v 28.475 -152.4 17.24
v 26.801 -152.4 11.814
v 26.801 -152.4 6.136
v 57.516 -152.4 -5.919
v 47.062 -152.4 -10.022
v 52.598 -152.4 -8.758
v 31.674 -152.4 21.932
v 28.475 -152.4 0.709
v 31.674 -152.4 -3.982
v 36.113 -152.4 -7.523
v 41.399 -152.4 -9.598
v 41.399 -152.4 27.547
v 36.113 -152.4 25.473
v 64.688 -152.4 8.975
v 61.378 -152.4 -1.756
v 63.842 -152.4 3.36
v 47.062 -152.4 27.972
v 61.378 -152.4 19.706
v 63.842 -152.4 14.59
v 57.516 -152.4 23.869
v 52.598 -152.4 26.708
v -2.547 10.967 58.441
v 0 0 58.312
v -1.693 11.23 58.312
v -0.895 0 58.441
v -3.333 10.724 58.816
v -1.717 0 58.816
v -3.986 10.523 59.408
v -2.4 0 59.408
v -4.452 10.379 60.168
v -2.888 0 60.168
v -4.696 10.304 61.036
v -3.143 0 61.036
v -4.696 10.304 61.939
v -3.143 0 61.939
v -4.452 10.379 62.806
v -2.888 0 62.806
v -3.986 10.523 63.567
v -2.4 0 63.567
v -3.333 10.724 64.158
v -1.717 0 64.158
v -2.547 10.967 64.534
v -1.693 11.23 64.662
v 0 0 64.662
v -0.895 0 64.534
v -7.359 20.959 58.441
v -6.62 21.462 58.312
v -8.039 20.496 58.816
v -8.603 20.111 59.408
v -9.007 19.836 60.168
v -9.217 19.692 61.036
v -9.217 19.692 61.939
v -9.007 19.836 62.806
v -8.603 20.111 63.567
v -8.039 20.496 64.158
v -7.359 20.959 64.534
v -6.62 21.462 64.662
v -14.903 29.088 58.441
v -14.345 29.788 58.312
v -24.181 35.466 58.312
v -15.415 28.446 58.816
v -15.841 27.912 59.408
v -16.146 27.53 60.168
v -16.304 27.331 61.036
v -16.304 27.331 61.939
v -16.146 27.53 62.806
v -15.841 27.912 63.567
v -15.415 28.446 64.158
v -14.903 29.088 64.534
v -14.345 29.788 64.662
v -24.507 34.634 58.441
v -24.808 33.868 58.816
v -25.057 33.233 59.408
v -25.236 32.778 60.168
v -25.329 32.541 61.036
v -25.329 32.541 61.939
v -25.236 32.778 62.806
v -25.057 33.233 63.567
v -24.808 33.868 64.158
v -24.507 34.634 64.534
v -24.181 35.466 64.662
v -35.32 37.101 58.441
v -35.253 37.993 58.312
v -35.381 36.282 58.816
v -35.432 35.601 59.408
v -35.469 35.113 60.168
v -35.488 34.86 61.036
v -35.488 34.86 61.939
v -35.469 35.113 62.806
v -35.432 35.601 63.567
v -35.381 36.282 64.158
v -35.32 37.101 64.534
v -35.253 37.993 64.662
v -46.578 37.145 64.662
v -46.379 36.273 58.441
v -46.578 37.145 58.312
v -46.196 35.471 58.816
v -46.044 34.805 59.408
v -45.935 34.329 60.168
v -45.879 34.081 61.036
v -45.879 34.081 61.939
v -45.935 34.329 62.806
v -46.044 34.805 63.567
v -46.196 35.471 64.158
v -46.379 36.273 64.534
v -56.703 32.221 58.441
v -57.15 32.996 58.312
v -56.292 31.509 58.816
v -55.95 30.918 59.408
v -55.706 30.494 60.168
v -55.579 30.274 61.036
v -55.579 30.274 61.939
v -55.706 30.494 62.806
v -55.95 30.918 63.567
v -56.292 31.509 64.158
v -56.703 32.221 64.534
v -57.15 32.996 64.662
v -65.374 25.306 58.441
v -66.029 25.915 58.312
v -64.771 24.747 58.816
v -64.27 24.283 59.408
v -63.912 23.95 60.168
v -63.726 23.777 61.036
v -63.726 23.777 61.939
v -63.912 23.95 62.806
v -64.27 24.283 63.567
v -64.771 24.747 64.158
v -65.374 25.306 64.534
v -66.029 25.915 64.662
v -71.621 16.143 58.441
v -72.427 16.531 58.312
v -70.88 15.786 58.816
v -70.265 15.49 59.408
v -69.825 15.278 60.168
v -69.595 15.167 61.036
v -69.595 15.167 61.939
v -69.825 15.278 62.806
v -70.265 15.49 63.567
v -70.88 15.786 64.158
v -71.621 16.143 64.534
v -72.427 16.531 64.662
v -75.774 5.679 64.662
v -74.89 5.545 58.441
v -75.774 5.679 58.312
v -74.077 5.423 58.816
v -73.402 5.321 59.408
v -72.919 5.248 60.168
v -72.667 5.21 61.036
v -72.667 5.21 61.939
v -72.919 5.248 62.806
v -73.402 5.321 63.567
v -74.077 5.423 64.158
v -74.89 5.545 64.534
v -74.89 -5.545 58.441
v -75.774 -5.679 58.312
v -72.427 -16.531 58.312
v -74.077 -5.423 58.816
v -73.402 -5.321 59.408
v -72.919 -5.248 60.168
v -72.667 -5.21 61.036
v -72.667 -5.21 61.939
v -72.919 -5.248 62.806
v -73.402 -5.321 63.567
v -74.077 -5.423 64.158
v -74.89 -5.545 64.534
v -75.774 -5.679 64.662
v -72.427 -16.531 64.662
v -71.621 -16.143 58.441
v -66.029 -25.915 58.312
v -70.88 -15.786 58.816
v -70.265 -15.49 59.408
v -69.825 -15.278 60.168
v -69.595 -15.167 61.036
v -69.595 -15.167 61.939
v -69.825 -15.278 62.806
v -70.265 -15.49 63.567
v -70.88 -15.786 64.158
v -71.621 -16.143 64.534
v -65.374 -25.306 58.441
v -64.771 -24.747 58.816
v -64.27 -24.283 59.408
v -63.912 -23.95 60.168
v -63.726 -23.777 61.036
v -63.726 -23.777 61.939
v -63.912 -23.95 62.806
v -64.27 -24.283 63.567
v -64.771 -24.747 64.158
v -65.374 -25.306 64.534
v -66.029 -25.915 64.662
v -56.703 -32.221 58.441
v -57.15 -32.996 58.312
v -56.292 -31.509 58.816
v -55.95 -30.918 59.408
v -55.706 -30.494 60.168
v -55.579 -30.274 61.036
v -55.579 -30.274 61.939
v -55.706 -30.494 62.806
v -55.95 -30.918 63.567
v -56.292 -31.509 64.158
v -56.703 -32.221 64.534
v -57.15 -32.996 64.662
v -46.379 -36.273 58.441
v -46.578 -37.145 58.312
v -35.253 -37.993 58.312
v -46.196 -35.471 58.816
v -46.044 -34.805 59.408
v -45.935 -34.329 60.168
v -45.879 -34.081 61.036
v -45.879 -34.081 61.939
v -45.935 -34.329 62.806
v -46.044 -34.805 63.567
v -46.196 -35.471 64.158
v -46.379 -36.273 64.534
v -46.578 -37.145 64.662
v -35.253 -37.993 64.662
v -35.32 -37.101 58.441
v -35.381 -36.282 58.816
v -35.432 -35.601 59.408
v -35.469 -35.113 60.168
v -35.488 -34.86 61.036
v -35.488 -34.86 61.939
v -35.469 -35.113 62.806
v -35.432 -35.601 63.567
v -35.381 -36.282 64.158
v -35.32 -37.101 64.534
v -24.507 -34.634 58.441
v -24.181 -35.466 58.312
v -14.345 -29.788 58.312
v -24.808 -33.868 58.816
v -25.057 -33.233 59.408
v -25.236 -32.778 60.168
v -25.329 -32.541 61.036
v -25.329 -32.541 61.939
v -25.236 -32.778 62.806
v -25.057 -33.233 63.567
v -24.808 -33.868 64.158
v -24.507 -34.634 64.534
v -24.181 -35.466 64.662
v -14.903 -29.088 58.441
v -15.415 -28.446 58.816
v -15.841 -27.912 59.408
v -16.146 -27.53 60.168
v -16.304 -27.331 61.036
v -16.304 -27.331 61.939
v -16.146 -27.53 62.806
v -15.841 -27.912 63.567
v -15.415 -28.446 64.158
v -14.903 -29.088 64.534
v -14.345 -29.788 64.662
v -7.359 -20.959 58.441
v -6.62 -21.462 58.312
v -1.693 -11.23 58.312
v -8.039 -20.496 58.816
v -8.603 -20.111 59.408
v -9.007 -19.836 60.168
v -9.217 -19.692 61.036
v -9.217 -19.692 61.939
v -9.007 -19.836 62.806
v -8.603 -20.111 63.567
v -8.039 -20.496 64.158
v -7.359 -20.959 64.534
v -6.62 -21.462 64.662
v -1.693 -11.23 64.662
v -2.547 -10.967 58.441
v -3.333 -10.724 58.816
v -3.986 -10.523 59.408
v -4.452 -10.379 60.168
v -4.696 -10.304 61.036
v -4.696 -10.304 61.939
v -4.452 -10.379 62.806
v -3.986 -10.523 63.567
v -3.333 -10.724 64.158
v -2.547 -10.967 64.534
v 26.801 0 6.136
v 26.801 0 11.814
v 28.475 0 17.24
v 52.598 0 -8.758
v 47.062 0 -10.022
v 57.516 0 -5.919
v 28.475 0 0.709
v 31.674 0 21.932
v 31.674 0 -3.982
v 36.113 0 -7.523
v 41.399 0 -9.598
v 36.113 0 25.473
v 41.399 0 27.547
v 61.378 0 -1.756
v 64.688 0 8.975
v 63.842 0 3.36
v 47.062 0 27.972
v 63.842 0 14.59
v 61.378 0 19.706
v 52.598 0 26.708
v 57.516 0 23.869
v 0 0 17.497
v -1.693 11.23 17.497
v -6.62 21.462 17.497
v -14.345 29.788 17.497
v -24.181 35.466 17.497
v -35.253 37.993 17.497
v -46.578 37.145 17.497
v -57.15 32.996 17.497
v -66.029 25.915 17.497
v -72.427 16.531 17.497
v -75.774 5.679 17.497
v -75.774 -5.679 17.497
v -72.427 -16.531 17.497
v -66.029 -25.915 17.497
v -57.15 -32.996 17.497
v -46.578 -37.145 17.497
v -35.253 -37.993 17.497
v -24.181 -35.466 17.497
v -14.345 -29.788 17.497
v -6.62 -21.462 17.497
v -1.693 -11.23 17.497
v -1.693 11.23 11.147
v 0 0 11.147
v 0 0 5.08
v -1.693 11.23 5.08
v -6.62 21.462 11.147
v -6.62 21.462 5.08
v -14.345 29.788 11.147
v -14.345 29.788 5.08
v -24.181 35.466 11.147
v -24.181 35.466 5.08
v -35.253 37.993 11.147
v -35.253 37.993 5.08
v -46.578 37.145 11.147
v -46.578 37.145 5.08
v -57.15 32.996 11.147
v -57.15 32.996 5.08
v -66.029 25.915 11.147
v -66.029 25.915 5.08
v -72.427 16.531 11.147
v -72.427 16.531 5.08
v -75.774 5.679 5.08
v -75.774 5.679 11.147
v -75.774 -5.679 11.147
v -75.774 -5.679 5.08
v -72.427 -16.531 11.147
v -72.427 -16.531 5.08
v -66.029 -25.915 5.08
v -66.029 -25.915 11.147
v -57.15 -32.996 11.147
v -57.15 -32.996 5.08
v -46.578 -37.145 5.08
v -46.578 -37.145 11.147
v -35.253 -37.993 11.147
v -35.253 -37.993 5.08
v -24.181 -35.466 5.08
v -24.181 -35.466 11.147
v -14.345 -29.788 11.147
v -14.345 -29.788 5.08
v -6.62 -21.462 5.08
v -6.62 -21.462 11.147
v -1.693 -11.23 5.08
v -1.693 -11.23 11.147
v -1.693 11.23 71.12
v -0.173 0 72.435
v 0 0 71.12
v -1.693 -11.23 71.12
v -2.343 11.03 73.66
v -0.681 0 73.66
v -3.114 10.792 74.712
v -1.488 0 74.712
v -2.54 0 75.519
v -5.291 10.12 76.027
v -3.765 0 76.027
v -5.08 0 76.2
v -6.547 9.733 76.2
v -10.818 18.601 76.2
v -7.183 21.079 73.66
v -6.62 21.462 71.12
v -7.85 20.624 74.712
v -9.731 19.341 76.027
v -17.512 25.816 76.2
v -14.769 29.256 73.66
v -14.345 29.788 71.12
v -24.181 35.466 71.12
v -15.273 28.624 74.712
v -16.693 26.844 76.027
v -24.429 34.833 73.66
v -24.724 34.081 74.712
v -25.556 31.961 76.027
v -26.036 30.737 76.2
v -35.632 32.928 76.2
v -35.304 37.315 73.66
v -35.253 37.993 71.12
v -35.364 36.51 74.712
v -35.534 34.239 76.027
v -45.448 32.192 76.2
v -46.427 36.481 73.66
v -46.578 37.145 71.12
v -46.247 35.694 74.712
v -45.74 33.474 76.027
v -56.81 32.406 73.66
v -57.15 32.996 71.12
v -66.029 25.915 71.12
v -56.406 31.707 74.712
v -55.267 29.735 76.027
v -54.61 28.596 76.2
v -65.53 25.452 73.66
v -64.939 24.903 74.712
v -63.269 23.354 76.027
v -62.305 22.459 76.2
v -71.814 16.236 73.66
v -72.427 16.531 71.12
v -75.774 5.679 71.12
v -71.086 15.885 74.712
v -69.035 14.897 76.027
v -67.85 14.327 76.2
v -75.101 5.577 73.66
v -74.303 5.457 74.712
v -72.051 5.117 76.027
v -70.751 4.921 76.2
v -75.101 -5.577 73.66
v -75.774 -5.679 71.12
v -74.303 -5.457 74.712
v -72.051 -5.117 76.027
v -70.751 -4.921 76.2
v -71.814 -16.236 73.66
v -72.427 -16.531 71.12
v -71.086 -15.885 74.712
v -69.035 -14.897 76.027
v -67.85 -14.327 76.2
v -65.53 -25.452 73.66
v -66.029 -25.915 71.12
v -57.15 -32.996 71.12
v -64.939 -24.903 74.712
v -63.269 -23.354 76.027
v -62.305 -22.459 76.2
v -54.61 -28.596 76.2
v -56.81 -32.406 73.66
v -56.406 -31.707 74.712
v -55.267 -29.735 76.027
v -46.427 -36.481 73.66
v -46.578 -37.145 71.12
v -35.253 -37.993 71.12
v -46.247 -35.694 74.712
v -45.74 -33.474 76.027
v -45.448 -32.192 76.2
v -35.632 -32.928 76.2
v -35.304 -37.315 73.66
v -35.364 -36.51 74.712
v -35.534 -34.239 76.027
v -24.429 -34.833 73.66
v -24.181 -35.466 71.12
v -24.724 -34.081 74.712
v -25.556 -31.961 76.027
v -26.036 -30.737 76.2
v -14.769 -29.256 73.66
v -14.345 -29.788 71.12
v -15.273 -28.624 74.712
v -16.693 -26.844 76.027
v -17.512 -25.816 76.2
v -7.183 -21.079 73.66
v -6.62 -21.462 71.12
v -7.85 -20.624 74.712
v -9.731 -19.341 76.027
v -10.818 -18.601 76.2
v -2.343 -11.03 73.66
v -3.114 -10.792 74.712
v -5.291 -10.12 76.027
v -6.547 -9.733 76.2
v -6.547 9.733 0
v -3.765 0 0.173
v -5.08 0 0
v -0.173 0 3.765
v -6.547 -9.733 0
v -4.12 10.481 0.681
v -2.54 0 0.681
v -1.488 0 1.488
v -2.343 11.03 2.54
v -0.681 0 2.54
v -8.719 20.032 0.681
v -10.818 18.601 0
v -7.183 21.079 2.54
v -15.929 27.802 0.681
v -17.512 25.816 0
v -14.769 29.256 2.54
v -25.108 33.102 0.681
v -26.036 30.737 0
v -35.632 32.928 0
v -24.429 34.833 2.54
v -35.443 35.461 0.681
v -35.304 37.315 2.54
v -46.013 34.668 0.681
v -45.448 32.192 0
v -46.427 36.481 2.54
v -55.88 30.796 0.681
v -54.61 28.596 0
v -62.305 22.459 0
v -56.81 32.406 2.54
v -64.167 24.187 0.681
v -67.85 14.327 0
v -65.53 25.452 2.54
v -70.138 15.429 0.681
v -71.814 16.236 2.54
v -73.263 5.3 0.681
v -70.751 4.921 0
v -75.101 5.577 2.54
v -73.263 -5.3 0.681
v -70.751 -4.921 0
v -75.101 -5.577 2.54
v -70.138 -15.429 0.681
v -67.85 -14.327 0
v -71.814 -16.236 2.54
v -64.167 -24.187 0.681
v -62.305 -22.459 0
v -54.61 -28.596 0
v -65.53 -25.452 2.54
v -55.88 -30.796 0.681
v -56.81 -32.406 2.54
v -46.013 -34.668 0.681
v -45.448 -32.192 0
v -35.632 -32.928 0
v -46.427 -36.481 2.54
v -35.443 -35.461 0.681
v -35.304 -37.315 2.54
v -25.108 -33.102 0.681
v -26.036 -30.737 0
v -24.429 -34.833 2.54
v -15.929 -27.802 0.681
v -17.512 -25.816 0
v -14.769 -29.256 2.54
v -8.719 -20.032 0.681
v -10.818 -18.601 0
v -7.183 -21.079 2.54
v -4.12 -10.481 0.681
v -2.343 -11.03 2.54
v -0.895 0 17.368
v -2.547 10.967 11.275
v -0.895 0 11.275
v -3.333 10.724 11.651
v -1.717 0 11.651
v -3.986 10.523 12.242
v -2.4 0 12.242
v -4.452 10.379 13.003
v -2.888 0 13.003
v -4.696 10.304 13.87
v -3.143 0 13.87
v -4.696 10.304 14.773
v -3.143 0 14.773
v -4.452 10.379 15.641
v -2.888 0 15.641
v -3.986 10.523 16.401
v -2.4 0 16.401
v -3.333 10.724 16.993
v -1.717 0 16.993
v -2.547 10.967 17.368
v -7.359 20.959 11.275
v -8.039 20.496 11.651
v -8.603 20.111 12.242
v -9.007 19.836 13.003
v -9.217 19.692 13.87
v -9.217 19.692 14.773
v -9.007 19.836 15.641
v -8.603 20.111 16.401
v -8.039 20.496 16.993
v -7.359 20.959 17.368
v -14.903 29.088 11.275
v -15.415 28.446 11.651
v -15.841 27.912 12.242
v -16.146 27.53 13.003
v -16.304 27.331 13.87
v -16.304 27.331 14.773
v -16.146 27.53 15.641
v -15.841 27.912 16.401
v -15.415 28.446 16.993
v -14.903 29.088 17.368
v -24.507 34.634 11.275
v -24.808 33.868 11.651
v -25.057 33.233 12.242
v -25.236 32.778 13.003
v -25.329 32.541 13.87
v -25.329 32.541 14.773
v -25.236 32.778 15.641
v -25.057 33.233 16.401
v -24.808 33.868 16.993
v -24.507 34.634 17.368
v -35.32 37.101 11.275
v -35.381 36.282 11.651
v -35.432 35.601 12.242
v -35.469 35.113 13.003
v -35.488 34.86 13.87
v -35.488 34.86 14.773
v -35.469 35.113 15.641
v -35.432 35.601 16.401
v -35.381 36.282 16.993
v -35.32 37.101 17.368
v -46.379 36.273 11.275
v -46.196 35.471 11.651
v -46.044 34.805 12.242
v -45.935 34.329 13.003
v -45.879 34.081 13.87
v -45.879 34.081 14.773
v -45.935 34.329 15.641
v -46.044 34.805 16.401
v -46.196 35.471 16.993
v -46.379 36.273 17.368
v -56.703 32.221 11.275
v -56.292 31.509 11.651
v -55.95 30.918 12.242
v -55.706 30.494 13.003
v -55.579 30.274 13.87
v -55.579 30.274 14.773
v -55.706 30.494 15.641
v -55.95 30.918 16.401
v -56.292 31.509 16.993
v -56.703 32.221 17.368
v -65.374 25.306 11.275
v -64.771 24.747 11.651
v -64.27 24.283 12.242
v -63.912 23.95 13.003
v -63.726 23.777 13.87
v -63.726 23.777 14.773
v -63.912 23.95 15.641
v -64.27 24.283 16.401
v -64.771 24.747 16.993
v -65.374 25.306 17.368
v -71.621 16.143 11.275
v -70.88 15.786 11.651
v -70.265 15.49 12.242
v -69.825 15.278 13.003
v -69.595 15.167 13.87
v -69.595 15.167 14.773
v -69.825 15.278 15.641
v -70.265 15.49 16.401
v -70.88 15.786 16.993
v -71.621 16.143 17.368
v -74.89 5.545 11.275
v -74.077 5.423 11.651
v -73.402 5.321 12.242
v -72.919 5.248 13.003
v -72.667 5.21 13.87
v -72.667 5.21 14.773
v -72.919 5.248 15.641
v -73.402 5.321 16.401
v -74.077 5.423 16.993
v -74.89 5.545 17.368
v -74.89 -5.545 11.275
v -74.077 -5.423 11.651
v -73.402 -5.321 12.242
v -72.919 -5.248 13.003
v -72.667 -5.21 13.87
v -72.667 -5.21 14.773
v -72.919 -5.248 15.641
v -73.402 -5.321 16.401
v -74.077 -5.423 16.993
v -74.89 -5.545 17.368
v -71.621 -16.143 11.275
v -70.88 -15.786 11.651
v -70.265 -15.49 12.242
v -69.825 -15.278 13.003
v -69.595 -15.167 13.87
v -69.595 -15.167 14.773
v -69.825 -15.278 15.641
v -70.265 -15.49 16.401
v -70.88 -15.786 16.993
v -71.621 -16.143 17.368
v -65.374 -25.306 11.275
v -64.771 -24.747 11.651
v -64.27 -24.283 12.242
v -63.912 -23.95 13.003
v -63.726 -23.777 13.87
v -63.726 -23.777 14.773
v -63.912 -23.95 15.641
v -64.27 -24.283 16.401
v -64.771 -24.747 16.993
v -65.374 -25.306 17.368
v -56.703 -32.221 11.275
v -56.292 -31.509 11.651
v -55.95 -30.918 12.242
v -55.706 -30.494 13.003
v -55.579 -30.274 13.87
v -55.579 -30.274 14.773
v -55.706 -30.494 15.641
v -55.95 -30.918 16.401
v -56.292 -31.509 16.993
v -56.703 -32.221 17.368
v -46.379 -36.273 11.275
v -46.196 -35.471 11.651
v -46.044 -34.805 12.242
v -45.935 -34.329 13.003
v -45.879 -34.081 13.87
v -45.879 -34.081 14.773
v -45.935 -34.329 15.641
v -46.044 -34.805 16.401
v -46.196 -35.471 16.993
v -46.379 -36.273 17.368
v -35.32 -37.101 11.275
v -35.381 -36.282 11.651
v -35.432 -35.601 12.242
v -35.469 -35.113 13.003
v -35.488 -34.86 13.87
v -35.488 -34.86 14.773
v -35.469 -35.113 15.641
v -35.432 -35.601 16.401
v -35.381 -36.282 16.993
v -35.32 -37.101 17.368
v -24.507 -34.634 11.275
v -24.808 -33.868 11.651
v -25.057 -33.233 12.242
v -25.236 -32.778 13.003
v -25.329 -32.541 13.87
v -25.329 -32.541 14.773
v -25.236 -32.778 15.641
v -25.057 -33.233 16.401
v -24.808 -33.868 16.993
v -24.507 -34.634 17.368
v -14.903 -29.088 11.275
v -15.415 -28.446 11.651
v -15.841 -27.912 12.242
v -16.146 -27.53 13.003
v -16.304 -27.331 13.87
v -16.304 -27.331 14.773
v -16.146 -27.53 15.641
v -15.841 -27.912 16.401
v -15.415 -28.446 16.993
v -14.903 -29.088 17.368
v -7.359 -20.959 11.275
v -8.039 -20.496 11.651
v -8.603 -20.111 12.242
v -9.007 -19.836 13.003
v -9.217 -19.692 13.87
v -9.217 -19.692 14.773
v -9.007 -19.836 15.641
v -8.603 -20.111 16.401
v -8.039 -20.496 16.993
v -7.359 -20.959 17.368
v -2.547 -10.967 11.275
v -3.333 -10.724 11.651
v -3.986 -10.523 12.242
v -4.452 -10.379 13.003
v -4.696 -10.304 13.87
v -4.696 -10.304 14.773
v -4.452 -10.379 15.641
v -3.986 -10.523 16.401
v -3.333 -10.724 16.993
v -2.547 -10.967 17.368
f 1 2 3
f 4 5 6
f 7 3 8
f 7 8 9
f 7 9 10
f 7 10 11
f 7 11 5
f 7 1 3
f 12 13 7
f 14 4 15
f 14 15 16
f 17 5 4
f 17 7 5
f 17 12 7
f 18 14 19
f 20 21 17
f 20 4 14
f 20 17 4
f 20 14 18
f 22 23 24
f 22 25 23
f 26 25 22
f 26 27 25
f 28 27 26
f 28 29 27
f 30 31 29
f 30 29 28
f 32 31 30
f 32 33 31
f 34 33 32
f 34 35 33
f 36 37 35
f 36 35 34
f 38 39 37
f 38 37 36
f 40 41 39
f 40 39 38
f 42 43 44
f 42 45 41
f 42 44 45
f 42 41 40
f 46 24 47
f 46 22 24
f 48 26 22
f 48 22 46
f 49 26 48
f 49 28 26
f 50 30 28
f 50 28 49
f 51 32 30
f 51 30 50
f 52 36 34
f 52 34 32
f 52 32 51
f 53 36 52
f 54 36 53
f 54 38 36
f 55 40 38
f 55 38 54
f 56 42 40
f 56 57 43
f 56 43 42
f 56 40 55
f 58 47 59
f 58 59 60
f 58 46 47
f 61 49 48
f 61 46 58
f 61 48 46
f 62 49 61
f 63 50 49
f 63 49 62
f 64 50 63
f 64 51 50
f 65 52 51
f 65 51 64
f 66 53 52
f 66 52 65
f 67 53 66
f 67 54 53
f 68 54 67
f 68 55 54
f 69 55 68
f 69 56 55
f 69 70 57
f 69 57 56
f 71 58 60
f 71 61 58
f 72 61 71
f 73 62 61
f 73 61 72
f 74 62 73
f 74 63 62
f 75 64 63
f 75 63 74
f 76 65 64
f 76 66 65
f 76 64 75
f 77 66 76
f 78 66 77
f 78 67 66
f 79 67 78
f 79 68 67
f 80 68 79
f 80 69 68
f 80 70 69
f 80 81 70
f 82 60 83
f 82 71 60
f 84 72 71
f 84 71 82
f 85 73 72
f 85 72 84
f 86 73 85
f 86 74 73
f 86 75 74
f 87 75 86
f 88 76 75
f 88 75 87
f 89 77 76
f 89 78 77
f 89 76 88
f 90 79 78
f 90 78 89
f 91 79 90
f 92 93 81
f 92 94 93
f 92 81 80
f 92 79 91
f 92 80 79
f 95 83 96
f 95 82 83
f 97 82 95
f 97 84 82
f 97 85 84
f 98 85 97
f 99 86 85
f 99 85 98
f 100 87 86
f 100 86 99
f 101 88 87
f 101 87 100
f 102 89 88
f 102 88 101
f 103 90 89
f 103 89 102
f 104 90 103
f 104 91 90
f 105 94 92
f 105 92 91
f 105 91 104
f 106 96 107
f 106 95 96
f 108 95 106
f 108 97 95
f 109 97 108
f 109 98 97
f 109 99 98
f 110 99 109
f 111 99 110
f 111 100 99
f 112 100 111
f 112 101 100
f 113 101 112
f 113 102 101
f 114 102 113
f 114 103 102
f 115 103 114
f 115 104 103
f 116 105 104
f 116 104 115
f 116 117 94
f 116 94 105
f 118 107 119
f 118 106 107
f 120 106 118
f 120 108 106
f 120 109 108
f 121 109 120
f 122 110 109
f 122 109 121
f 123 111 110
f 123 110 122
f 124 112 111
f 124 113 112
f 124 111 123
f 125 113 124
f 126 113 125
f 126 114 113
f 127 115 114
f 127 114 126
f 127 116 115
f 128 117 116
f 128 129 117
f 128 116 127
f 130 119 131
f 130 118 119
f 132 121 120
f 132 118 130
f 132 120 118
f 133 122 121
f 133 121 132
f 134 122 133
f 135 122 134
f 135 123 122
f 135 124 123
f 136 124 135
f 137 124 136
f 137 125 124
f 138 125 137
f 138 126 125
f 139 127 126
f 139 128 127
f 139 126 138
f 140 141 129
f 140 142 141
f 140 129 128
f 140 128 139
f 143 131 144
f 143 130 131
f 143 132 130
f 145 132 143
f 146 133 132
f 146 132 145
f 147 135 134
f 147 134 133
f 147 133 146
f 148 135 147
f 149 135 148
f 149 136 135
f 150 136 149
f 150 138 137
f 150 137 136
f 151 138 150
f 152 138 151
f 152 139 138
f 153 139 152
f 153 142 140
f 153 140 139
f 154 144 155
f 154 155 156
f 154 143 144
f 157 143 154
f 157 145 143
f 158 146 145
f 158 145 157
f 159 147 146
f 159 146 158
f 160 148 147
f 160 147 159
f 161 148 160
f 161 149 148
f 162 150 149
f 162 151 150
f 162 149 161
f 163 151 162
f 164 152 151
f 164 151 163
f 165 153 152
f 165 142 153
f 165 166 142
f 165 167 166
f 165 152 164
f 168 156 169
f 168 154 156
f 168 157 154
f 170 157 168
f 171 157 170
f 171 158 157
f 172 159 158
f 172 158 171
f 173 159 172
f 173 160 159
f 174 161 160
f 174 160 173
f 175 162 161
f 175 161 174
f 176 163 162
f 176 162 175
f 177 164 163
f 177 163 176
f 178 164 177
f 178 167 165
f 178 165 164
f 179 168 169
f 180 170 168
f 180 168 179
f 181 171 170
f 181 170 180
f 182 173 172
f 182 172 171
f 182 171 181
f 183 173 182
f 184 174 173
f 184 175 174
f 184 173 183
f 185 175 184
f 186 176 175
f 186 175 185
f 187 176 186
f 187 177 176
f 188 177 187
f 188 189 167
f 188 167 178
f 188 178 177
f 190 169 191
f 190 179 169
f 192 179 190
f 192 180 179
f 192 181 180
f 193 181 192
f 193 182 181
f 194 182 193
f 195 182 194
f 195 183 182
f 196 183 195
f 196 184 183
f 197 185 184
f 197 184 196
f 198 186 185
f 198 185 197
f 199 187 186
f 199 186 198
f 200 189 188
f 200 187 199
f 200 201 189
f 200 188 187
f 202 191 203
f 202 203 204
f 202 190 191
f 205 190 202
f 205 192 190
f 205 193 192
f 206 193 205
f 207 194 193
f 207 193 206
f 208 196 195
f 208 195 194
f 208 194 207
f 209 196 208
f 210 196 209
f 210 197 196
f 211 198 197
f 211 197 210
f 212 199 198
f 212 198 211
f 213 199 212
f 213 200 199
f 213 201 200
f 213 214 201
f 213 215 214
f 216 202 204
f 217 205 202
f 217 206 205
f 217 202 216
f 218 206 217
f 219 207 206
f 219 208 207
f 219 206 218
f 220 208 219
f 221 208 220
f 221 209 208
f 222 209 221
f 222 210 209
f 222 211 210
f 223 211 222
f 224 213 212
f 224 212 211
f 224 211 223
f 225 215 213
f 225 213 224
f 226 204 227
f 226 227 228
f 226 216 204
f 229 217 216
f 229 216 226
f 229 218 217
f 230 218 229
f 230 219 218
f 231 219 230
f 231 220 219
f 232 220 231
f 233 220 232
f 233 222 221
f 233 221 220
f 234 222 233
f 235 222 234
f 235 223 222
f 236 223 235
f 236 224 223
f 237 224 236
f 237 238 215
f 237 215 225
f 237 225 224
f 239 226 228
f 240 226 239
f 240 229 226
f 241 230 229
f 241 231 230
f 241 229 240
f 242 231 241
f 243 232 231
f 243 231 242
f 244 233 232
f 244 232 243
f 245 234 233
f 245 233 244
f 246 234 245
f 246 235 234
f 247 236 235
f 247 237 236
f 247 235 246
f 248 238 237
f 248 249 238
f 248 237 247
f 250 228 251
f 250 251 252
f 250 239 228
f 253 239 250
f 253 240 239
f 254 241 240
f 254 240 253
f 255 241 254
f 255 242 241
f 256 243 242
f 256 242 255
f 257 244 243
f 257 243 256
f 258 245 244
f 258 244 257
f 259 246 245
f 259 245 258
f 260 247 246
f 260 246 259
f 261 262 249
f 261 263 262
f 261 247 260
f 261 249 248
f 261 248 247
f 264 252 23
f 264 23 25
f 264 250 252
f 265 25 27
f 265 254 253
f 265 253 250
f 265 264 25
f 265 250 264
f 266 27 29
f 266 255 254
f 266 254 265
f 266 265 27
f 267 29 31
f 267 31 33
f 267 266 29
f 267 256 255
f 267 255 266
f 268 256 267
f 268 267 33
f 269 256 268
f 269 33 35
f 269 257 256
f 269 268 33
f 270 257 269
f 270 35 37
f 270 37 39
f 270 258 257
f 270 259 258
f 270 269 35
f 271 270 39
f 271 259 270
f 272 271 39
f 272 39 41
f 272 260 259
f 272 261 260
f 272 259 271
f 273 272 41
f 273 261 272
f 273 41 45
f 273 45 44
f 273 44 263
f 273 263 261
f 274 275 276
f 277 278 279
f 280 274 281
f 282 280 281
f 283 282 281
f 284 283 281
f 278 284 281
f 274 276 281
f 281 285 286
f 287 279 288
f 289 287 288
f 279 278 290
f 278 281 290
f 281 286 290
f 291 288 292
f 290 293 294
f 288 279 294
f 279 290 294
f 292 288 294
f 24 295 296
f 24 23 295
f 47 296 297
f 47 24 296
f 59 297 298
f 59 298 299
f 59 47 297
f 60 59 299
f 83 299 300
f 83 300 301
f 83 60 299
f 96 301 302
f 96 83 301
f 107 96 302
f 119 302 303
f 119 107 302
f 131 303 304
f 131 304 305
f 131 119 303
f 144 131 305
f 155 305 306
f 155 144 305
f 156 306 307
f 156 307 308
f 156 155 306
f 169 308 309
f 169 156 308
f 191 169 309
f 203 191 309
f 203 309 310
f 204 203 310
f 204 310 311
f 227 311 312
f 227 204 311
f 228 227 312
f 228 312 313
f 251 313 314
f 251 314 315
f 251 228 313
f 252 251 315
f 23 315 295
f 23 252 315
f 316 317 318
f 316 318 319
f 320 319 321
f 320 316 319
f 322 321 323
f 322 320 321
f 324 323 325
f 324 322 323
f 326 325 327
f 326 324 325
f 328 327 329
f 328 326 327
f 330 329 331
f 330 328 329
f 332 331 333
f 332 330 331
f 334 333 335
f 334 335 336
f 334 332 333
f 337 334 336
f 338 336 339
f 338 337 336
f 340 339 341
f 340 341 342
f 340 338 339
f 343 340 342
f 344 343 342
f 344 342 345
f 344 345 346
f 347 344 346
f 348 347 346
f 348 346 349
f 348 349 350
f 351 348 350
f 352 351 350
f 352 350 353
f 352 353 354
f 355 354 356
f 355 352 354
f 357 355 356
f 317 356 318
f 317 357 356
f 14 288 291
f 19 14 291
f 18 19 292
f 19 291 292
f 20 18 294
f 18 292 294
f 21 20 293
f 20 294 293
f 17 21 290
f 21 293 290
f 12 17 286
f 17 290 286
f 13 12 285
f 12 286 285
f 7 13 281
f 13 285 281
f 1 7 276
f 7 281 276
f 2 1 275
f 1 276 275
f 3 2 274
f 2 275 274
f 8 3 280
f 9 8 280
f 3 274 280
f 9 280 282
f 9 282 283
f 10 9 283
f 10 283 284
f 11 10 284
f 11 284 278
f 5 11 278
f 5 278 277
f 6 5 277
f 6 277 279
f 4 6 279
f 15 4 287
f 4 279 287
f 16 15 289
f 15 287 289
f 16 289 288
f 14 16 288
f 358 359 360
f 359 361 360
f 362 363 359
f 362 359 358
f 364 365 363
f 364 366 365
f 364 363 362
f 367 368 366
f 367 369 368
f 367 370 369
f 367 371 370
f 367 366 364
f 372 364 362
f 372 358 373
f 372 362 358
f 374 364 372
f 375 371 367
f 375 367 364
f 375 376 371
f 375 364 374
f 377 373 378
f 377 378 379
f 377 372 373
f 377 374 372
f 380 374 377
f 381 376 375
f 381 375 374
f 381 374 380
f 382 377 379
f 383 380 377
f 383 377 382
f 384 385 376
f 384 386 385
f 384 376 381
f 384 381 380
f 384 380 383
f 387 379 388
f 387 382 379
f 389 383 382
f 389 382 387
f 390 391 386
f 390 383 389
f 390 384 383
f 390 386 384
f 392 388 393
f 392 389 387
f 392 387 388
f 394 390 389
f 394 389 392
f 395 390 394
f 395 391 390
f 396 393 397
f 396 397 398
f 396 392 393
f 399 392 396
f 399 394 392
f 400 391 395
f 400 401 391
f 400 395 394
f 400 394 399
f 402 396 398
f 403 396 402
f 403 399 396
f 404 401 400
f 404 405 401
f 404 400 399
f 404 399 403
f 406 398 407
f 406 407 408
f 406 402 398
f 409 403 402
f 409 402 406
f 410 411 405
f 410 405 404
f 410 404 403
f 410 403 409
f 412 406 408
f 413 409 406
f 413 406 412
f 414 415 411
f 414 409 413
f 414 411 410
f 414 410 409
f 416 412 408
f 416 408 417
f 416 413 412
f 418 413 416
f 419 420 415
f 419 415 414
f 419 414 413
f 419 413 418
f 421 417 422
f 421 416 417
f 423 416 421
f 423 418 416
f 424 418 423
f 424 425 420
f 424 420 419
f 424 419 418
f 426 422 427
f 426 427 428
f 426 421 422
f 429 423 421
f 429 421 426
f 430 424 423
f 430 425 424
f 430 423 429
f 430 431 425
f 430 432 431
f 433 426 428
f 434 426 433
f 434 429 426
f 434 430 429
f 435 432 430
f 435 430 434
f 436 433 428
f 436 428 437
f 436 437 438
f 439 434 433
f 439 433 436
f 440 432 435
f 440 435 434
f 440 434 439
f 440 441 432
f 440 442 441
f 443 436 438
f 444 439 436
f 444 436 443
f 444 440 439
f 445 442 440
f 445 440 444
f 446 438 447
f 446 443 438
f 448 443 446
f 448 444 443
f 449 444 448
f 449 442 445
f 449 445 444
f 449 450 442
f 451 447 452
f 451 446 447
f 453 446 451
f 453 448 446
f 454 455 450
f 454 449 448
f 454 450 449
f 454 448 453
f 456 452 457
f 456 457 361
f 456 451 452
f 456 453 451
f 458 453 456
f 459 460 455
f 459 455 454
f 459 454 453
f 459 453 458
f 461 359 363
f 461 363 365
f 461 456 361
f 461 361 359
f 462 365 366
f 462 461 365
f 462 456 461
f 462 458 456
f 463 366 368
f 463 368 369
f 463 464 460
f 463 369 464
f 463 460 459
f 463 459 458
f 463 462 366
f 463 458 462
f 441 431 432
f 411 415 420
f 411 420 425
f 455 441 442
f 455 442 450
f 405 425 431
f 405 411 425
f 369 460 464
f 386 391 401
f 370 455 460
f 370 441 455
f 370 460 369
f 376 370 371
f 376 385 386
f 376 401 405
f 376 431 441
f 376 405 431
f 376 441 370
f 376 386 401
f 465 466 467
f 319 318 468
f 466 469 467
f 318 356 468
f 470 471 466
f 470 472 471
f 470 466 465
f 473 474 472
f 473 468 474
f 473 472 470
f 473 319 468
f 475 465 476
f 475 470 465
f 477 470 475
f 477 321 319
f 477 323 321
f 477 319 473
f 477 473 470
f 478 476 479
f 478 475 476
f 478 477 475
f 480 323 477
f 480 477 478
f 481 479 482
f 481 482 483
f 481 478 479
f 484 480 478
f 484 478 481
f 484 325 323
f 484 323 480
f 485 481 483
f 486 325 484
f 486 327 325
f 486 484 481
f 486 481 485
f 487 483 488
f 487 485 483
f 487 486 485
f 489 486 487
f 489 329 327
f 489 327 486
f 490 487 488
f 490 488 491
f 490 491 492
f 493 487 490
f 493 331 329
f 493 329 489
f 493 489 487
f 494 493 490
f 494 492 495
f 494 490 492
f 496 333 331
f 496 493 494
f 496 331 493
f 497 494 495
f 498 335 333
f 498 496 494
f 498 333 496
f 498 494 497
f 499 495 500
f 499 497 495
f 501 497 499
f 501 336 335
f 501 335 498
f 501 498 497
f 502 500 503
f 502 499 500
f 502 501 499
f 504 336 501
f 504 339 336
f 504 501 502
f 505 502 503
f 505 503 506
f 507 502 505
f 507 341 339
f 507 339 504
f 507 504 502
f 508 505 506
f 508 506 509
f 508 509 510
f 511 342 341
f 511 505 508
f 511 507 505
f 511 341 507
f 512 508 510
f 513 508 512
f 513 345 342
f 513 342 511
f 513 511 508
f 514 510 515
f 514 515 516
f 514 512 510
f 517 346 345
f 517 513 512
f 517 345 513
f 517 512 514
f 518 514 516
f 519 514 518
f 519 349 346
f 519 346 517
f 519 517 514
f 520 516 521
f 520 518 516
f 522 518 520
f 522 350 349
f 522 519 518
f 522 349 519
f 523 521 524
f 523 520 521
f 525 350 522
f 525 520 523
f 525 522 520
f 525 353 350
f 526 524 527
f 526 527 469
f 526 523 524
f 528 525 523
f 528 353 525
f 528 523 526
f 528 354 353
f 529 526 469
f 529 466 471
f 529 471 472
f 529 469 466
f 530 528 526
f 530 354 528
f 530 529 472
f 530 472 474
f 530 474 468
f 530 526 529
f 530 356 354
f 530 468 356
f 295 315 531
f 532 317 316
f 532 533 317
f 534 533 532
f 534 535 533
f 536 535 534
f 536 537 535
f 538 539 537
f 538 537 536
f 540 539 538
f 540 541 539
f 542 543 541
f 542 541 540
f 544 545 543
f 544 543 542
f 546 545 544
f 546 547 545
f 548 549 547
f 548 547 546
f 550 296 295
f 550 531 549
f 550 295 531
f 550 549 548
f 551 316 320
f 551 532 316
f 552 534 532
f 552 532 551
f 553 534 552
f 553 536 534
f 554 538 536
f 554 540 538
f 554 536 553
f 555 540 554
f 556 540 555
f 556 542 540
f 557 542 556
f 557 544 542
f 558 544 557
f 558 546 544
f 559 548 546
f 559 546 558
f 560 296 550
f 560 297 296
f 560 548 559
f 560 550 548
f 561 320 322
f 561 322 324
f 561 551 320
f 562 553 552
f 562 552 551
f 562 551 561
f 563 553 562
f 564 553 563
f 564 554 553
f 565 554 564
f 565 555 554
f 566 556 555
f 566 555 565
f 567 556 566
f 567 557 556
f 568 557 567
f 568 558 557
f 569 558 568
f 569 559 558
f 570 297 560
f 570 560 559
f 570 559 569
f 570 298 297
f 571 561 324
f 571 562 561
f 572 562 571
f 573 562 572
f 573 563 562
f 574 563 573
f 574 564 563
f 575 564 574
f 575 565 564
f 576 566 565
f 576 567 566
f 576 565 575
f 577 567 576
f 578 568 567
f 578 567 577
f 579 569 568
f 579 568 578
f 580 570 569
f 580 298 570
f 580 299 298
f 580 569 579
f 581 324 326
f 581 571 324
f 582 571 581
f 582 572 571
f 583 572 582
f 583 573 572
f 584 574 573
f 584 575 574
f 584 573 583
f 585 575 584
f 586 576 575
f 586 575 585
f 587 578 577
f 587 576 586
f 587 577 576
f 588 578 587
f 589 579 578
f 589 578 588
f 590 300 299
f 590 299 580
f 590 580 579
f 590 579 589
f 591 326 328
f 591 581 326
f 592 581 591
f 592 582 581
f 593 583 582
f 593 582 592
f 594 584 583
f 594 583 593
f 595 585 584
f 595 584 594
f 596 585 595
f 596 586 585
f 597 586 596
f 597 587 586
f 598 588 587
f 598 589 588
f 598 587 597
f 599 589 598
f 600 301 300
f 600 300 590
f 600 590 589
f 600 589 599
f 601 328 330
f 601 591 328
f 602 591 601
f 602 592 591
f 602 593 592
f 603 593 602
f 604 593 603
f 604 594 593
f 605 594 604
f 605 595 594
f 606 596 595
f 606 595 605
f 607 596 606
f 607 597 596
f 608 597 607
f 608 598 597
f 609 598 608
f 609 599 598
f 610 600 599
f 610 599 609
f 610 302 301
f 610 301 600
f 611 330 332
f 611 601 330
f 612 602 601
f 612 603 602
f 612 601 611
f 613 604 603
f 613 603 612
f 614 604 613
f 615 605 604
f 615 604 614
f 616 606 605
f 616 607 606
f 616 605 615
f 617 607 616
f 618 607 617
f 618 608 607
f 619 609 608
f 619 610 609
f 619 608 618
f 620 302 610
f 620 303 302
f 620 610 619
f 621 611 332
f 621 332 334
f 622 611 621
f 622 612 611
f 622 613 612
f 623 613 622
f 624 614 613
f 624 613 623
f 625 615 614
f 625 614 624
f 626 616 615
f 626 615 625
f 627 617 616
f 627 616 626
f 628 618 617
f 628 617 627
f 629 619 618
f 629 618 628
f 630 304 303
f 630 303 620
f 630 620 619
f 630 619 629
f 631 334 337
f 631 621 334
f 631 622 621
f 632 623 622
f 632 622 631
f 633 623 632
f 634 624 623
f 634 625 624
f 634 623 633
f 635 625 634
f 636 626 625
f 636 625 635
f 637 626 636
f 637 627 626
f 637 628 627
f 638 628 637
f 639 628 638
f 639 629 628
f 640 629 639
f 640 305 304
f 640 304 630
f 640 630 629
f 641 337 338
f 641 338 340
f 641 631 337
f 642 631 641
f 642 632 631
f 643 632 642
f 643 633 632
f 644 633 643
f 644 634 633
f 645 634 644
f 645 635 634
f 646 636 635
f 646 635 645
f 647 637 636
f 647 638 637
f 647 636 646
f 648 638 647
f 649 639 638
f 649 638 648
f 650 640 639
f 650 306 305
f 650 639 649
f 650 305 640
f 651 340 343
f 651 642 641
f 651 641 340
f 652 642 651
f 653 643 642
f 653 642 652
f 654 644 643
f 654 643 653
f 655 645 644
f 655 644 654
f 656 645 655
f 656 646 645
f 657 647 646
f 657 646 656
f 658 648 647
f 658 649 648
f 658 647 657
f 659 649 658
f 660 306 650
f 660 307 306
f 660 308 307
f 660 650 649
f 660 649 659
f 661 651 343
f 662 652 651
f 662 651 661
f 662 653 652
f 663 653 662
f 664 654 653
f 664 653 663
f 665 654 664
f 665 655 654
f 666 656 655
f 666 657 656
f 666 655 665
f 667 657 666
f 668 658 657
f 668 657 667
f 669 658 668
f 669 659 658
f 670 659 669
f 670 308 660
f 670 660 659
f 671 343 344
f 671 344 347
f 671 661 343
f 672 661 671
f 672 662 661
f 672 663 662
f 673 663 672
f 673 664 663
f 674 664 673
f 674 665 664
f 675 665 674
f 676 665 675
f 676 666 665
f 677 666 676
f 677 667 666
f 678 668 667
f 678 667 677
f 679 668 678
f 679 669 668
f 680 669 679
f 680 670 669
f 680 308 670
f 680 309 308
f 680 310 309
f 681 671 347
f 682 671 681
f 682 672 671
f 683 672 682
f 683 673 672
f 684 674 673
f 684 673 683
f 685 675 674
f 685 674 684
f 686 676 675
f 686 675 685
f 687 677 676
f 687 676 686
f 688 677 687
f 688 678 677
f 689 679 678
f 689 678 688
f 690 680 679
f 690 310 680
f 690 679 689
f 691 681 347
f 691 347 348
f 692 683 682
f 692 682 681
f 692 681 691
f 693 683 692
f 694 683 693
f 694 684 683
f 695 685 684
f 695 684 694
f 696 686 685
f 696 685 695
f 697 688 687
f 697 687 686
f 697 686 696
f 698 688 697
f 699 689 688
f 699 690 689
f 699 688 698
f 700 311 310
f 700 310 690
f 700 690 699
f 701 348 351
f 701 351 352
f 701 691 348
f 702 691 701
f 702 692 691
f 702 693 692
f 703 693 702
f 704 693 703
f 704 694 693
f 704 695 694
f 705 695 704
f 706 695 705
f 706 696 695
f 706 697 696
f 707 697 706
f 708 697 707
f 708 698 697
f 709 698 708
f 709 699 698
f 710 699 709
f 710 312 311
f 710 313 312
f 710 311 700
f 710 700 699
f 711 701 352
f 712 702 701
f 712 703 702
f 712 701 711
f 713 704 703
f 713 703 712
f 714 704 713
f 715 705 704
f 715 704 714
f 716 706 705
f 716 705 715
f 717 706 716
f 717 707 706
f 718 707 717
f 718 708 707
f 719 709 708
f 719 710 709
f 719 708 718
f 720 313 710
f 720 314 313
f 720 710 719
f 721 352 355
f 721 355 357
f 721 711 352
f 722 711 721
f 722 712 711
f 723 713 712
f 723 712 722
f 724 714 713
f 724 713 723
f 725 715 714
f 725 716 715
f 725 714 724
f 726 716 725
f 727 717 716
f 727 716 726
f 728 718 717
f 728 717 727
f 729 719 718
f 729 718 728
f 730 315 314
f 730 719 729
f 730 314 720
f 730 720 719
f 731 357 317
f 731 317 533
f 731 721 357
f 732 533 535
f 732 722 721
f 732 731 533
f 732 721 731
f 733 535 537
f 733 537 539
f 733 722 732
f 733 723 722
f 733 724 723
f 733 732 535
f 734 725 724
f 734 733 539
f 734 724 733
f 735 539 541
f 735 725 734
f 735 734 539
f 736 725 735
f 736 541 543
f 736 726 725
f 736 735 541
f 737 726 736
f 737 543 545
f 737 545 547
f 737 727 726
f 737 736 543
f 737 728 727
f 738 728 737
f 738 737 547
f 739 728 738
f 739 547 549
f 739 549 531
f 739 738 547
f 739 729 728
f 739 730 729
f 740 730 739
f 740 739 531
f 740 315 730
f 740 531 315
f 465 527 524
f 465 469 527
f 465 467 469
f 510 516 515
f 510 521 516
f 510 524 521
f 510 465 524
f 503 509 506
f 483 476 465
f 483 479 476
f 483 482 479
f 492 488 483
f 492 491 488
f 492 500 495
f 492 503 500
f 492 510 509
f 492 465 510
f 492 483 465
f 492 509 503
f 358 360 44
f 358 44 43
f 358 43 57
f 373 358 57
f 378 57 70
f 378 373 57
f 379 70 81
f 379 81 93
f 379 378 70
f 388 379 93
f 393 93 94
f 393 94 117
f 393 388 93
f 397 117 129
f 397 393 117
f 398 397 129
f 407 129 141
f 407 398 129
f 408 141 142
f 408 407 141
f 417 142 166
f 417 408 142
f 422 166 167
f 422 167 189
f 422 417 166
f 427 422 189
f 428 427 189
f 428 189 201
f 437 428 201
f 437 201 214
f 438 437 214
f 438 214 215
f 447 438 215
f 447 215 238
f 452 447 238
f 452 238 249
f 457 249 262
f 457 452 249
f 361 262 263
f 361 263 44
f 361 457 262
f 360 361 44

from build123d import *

# Parameters (mm, degrees)
F2_R     = 5.08
F3_R     = 19.05
F4_DEPTH = 152.4


with BuildPart() as f1:
    # F0 (on Front) → F1 (revolve)
    with BuildSketch(Plane.XZ):
        with BuildLine():
            Line((-38.1, 0), (0, 0))
            Line((0, 0), (0, 11.146598))
            ThreePointArc((0, 11.146598), (-3.175, 14.321598), (0, 17.496598))
            Line((0, 17.496598), (0, 58.312399))
            ThreePointArc((0, 58.312399), (-3.175, 61.487399), (0, 64.662399))
            Line((0, 64.662399), (0, 76.2))
            Line((0, 76.2), (-38.1, 76.2))
            Line((-38.1, 76.2), (-38.1, 0))
        make_face()
    revolve(axis=Axis((-38.1, 0, 38.1), (0, 0, 1)))

    # F2
    f2_edges = [f1.edges().sort_by_distance(p)[0] for p in [
        (-76.2, 0, 76.2),
        (-76.2, 0, 0),
    ]]
    fillet(f2_edges, radius=F2_R)


with BuildPart() as f4:
    # F3 (on Front) → F4 (new body)
    with BuildSketch(Plane.XZ):
        with Locations((45.638163, 8.974869)):
            Circle(F3_R)
    extrude(amount=F4_DEPTH)


solid = Compound([f1.part, f4.part])
